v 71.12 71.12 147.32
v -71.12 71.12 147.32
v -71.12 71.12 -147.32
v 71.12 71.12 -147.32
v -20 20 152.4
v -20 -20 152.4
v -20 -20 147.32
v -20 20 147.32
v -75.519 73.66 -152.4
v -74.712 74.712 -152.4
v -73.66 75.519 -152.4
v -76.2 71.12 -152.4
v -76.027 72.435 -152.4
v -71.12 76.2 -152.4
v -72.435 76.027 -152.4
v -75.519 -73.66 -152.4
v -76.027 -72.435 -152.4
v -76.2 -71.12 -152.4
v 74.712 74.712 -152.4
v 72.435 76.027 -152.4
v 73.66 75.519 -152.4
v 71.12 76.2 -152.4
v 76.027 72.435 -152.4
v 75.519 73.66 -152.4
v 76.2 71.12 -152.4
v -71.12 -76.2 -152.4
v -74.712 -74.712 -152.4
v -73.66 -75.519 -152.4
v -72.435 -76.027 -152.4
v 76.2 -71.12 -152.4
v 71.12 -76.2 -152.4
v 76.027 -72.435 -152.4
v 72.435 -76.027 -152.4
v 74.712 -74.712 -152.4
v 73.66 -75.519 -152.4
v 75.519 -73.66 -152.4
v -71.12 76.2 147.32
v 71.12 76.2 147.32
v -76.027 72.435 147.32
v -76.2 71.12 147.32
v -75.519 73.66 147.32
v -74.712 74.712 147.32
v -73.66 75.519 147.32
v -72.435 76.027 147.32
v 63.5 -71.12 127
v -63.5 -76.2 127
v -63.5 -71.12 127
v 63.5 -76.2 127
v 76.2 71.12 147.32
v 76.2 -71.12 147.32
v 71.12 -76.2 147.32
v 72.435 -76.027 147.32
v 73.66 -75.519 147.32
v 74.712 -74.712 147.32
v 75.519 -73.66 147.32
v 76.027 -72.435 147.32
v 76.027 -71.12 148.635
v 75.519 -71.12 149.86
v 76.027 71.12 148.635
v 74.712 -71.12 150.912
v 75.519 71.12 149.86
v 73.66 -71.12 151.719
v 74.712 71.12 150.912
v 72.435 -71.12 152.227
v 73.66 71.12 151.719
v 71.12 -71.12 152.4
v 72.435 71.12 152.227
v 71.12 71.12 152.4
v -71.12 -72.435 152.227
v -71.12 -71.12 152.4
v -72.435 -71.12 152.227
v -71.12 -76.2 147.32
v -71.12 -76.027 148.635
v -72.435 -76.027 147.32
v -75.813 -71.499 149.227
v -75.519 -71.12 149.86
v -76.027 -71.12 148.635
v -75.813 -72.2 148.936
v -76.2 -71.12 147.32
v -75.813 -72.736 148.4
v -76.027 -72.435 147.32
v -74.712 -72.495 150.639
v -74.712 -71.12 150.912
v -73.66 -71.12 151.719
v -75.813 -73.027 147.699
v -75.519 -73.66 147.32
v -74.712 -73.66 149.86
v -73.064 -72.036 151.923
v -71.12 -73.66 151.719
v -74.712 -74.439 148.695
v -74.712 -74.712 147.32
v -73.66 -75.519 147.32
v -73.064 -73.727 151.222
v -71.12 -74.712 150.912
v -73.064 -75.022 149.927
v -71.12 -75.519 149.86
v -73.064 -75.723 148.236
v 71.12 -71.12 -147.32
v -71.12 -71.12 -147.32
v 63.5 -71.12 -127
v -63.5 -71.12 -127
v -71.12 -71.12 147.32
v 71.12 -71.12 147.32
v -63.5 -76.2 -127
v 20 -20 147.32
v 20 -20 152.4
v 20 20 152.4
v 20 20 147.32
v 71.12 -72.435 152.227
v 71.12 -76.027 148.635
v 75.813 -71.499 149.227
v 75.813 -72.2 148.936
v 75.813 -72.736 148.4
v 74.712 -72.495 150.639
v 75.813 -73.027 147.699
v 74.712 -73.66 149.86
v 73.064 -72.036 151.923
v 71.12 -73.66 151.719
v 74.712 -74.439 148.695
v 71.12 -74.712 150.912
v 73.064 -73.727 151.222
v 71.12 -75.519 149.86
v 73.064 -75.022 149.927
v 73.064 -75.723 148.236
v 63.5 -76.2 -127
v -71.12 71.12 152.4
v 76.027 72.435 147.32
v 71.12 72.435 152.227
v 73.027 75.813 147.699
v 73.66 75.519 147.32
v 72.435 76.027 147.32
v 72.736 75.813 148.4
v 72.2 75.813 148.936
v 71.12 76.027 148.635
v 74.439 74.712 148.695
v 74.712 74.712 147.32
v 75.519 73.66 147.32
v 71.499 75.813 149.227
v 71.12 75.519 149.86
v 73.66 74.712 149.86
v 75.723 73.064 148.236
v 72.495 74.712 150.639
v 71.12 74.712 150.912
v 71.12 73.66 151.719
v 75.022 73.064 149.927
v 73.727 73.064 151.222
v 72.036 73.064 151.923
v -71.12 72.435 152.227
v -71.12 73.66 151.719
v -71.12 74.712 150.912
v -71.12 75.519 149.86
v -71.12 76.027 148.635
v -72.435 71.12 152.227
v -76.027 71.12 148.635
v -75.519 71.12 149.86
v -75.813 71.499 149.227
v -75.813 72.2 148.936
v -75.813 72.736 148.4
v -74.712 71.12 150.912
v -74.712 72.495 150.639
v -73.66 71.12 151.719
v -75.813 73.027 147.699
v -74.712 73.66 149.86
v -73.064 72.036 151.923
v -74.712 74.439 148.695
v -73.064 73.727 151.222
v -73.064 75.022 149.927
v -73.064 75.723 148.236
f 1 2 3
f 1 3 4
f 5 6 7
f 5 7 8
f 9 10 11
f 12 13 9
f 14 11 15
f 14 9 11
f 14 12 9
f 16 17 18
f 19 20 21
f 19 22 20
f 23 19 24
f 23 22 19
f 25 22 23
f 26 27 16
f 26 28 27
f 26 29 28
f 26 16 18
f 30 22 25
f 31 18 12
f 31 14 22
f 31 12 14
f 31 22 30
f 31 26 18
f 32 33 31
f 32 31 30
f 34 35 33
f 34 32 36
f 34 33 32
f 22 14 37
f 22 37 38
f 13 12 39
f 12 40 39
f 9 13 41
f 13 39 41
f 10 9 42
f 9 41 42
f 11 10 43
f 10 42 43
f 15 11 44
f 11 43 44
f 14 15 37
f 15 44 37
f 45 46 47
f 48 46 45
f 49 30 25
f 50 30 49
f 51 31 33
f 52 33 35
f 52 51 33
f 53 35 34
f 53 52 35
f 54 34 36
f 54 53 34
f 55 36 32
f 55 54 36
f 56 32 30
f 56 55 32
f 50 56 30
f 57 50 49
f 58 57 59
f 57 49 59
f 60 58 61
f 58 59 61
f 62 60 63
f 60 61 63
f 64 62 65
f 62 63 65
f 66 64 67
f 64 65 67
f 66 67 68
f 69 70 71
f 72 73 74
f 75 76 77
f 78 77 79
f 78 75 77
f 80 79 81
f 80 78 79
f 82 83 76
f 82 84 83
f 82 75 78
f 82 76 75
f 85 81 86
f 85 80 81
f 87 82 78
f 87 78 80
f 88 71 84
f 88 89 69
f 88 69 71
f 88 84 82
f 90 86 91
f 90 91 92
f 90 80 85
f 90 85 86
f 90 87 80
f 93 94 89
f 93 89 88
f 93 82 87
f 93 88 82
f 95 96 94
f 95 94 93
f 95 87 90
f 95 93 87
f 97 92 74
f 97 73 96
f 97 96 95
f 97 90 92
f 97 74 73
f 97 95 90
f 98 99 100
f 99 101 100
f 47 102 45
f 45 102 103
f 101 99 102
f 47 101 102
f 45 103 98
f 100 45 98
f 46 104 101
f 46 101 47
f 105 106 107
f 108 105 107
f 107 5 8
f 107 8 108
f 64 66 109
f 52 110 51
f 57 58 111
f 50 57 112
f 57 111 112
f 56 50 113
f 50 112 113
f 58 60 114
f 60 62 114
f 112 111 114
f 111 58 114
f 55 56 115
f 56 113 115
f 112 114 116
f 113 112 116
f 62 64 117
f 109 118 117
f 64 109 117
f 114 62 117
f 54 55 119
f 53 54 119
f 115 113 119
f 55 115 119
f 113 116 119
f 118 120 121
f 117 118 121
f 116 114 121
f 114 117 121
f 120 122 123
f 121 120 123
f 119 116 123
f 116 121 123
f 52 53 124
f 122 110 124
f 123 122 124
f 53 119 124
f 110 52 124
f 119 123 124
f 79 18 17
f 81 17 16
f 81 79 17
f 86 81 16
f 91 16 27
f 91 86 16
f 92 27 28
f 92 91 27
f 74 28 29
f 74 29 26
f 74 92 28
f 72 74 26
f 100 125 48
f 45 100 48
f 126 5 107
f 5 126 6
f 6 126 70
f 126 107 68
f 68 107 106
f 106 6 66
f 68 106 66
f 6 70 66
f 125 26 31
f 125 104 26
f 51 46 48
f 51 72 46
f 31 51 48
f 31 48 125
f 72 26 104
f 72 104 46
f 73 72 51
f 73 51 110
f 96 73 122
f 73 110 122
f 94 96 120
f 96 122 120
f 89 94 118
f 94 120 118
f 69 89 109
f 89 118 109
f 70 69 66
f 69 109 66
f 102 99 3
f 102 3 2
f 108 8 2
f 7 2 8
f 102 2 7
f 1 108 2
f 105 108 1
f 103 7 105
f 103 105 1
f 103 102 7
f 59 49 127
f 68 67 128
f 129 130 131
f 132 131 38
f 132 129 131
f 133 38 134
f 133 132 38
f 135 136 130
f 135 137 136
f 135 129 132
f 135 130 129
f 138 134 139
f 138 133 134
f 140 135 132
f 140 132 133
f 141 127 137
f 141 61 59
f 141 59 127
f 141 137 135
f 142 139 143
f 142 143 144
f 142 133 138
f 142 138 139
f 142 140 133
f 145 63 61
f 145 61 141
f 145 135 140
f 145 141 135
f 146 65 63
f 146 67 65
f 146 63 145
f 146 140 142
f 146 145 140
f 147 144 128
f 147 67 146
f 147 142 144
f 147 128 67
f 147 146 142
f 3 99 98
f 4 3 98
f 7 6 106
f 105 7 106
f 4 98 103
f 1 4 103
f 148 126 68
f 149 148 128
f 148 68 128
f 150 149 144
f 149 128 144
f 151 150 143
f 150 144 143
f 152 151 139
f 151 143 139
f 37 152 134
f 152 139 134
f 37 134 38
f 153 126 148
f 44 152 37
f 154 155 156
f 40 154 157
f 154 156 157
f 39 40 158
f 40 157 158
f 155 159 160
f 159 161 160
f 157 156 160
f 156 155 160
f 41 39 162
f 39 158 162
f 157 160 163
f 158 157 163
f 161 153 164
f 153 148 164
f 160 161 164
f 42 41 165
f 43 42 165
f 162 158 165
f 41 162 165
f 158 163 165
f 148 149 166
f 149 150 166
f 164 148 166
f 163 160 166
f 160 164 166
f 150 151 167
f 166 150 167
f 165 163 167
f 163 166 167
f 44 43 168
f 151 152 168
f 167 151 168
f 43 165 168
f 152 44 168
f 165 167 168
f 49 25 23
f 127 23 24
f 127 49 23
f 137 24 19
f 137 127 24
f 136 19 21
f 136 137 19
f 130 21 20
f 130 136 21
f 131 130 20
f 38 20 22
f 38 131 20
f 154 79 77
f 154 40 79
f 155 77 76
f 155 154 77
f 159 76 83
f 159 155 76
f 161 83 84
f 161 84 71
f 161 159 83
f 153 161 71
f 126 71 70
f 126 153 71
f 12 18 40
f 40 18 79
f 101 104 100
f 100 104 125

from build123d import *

# Parameters (mm, degrees)
F0_W     = 152.4
F0_H     = 304.8
F1_DEPTH = 76.2
F2_R     = 5.08
F3_T     = 5.08
F4_W     = 127
F4_H     = 254
F5_DEPTH = 25.4
F6_W     = 40
F6_H     = 40
F7_DEPTH = 5.08


# Not quite as in the source:
# - a shell that OpenCascade refuses in one call is made with other operations: the cavity is built on its own and cut out


with BuildPart() as f1:
    # F0 (on Front) → F1 (new body, symmetric)
    with BuildSketch(Plane.XZ):
        Rectangle(F0_W, F0_H)
    extrude(amount=F1_DEPTH, both=True)

    # F2
    f2_edges = [f1.edges().sort_by_distance(p)[0] for p in [
        (0, -76.2, 152.4),
        (76.2, 0, 152.4),
        (76.2, -76.2, 0),
        (76.2, 76.2, 0),
        (0, 76.2, 152.4),
        (-76.2, 0, 152.4),
        (-76.2, -76.2, 0),
        (-76.2, 76.2, 0),
    ]]
    fillet(f2_edges, radius=F2_R)

    # F3: shell of thickness 5.08, made by hand


with BuildPart() as f3_core1:
    # F3_t2: copy of F1
    add(f1.part)

    # the walls: a layer under each face that stays
    f3_faces = [f3_core1.faces().sort_by_distance(p)[0] for p in [
        (0, 0, -152.4),
        (0, 76.2, -2.54),
        (-76.2, 0, -2.54),
        (76.2, 0, -2.54),
        (0, -76.2, -2.54),
        (0, 0, 152.4),
    ]]
    thicken(f3_faces, amount=-F3_T, mode=Mode.SUBTRACT)


with BuildPart() as f1_1:
    add(f1.part)

    # what is left inside the walls is the cavity
    f3_cavity = [f3_core1.part.solids().sort_by_distance(p)[0] for p in [
        (-71.0692, 23.706667, 0),
    ]]
    add(f3_cavity, mode=Mode.SUBTRACT)

    # F4 (on face) → F5 (cut)
    with BuildSketch(Plane.XZ.offset(76.2)):
        Rectangle(F4_W, F4_H)
    extrude(amount=-F5_DEPTH, mode=Mode.SUBTRACT)

    # F6 (on face) → F7 (cut)
    with BuildSketch(Plane.XY.offset(152.4)):
        Rectangle(F6_W, F6_H)
    extrude(amount=-F7_DEPTH, mode=Mode.SUBTRACT)


solid = f1_1.part
